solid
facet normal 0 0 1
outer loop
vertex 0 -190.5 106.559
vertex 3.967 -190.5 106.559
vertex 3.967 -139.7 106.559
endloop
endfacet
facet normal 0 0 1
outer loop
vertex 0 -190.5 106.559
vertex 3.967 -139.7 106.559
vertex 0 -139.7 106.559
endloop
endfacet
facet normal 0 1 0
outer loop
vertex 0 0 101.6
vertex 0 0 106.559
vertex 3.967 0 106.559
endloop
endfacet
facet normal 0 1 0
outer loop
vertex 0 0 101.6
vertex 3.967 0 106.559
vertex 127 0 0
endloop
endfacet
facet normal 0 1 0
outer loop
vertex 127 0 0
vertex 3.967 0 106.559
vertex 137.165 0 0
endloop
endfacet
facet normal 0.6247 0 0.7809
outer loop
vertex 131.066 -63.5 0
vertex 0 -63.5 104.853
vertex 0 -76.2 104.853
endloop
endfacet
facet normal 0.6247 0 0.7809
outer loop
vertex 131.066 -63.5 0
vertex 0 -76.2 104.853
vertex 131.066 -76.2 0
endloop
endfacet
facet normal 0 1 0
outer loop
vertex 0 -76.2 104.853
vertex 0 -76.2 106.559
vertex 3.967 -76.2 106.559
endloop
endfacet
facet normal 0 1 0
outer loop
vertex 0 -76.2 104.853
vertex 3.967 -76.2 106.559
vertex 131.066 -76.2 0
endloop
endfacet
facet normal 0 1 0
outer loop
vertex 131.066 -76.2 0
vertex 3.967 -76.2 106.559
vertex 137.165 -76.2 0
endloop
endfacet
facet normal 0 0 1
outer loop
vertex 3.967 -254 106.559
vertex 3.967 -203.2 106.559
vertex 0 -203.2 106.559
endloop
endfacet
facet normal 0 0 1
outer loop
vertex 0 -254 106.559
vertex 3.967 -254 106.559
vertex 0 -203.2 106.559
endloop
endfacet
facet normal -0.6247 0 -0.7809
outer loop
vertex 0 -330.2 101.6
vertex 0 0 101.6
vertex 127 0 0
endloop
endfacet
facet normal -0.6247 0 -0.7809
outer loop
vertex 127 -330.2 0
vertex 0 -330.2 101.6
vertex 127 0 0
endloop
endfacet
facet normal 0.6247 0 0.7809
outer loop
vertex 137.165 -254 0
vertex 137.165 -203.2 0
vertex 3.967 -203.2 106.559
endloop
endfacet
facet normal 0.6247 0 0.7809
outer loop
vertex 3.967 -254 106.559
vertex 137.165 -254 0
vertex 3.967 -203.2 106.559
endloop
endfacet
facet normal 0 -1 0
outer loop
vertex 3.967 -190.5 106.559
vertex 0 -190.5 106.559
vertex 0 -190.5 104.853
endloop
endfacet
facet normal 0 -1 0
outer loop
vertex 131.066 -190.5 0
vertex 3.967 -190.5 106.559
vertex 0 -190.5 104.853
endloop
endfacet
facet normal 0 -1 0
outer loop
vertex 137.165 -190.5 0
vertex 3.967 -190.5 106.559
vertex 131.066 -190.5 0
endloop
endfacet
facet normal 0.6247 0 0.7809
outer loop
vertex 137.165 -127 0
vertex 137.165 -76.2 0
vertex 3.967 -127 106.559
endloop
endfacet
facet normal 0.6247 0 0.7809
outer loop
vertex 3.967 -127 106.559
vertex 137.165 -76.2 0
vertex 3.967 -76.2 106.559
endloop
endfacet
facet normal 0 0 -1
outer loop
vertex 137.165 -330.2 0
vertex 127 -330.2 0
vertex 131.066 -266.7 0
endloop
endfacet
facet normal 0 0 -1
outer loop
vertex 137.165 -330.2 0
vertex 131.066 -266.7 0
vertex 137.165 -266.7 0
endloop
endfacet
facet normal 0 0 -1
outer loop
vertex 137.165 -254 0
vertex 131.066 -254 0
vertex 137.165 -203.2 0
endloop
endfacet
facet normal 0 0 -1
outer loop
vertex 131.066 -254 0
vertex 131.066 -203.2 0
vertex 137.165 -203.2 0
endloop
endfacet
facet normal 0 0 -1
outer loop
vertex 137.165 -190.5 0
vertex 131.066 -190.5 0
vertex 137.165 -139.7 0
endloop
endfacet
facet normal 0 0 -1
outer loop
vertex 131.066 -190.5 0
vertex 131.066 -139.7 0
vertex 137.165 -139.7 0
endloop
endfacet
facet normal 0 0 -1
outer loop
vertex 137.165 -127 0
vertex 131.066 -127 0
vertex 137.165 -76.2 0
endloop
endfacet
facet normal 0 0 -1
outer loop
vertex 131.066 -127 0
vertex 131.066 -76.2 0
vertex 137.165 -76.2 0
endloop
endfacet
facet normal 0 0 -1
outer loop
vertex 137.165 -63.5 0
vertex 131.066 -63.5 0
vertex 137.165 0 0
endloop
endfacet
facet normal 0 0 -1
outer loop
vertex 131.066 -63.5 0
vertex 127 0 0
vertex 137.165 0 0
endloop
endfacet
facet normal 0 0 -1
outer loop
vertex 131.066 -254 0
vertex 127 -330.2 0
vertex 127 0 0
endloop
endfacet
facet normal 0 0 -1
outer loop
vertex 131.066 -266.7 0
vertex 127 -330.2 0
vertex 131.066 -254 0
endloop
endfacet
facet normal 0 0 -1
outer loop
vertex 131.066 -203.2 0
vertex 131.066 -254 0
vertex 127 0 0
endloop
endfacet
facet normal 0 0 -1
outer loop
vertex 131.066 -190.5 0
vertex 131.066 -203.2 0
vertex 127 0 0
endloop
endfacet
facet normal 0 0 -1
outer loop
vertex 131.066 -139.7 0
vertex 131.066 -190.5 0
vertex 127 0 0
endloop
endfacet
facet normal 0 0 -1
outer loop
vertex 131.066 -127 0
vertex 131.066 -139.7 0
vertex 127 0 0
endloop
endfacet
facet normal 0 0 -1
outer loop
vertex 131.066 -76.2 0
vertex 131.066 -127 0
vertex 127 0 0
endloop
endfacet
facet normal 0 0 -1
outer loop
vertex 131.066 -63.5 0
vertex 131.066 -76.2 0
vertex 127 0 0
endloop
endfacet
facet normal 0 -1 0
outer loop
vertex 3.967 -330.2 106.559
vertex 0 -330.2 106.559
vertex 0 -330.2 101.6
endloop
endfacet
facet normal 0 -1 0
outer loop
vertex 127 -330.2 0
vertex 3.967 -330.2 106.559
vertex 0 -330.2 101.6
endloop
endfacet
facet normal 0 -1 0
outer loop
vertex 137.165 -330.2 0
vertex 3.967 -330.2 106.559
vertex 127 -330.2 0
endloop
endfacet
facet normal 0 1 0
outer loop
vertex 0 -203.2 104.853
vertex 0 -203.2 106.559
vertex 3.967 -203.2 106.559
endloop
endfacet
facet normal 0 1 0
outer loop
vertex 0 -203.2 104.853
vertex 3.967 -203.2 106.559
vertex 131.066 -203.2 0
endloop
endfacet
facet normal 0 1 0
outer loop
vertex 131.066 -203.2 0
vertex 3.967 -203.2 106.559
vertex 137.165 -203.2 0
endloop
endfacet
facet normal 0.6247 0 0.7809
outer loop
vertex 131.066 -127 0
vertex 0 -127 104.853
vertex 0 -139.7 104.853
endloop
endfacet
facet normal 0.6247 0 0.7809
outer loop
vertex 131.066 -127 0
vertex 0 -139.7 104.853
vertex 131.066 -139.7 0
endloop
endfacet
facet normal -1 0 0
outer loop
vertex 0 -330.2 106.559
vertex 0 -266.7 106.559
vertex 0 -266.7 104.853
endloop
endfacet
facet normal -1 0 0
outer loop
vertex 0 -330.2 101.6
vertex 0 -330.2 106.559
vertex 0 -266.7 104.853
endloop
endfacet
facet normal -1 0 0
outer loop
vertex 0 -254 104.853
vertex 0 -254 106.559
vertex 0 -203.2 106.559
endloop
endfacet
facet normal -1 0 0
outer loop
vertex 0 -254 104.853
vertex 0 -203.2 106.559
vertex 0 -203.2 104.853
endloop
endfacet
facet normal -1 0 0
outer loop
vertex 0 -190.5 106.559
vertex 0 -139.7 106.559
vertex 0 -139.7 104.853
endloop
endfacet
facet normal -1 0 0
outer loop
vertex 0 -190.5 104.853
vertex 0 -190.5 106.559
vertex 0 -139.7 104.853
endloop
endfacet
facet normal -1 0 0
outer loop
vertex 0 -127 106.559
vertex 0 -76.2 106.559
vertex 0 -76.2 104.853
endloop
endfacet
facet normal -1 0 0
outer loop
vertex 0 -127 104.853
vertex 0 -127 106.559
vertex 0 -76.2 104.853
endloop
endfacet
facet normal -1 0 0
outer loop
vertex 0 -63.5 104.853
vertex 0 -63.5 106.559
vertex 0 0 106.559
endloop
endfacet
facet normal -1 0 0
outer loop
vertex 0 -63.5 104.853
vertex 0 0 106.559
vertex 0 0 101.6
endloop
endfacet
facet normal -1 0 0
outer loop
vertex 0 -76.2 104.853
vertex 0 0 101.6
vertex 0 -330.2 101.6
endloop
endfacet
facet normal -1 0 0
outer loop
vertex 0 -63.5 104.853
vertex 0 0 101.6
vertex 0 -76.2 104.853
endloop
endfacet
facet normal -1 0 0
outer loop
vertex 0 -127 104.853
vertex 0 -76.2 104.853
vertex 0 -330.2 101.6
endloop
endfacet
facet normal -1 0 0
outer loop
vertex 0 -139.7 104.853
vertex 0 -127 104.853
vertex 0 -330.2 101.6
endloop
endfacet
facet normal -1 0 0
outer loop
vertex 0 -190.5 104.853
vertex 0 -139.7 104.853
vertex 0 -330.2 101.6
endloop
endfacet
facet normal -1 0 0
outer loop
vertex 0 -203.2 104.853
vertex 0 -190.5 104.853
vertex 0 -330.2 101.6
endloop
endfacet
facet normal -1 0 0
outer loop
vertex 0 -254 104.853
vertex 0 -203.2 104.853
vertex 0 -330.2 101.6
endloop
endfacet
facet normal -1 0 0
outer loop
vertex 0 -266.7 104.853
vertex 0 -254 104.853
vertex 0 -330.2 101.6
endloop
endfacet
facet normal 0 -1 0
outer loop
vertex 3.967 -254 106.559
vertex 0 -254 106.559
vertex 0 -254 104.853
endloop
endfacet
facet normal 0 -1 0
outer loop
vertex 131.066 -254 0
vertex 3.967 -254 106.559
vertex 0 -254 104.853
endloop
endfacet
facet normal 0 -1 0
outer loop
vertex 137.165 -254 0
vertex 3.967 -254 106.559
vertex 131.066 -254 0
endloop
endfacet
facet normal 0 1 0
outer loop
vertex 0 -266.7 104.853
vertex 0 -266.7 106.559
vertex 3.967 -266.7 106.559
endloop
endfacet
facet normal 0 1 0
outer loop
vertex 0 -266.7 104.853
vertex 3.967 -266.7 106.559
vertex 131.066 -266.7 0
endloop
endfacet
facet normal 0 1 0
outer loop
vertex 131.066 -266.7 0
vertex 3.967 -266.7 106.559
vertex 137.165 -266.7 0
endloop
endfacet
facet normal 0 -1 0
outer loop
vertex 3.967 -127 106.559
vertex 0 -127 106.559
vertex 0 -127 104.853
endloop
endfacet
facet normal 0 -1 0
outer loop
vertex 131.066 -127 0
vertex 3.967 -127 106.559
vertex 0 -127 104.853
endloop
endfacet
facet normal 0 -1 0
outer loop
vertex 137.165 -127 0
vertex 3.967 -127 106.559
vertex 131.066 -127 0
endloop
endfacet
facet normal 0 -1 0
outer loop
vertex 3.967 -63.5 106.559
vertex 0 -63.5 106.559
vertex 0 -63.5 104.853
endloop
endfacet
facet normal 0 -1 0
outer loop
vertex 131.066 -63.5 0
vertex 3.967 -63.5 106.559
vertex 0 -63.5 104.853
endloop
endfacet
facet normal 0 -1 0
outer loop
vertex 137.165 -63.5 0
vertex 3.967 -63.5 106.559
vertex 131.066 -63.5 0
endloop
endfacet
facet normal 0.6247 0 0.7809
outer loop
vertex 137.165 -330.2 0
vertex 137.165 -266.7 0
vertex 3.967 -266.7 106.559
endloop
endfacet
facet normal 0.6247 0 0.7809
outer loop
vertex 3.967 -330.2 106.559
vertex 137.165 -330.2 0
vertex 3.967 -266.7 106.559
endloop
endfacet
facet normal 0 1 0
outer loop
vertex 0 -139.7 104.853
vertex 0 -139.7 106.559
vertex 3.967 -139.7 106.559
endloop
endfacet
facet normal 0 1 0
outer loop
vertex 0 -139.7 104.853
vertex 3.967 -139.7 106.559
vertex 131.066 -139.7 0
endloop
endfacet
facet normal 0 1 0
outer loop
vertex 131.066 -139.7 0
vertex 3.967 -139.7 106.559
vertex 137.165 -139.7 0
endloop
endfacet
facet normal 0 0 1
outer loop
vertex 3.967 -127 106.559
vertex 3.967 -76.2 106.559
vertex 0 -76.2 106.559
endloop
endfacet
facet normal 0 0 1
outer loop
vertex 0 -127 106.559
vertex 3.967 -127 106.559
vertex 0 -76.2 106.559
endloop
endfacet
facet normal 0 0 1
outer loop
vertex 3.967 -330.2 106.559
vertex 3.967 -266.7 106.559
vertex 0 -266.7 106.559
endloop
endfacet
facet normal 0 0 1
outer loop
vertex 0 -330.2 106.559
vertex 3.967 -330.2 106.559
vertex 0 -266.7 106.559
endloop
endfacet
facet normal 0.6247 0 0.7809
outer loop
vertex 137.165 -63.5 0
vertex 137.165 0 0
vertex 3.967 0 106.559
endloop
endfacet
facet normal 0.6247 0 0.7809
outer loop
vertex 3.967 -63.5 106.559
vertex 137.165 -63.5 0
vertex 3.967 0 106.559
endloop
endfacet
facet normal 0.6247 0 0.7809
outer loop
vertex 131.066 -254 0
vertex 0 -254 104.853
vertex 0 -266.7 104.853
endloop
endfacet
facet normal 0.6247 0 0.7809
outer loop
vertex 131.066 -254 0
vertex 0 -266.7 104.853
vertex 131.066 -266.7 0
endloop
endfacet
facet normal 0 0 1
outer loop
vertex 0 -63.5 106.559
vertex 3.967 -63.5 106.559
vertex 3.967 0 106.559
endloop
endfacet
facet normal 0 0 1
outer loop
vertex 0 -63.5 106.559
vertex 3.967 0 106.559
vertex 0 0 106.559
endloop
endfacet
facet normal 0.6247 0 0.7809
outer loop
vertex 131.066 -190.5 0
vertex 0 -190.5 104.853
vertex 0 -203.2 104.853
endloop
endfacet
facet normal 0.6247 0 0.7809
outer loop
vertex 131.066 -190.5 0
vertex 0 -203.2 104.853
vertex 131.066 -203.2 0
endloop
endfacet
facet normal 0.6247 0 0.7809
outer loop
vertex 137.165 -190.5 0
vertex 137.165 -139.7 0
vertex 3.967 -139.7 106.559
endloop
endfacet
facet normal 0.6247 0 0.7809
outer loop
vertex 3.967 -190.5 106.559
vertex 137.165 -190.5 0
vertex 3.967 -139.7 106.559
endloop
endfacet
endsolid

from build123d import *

# Parameters (mm, degrees)
F1_DEPTH = 330.2
F2_W     = 228.6
F2_H     = 12.7
F3_DEPTH = 3.81


with BuildPart() as f1:
    # F0 (on Front) → F1 (new body)
    with BuildSketch(Plane.XZ):
        Polygon((0, 106.55851694), (0, 101.6), (127, 0), (137.1649597269, 0), (3.966813552, 106.55851694), align=None)
    extrude(amount=F1_DEPTH)

    # F2 (on face) → F3 (cut)
    with BuildSketch(Plane(origin=(53.5277891617, 0, 66.9097364522), x_dir=(0.7808688094, 0, -0.6246950476), z_dir=(0.6246950476, 0, 0.7808688094))):
        with Locations((21.8194109839, -260.35)):
            Rectangle(F2_W, F2_H)
        with Locations((21.8194109839, -196.85)):
            Rectangle(F2_W, F2_H)
        with Locations((21.8194109839, -133.35)):
            Rectangle(F2_W, F2_H)
        with Locations((21.8194109839, -69.85)):
            Rectangle(F2_W, F2_H)
    extrude(amount=-F3_DEPTH, mode=Mode.SUBTRACT)


solid = f1.part
